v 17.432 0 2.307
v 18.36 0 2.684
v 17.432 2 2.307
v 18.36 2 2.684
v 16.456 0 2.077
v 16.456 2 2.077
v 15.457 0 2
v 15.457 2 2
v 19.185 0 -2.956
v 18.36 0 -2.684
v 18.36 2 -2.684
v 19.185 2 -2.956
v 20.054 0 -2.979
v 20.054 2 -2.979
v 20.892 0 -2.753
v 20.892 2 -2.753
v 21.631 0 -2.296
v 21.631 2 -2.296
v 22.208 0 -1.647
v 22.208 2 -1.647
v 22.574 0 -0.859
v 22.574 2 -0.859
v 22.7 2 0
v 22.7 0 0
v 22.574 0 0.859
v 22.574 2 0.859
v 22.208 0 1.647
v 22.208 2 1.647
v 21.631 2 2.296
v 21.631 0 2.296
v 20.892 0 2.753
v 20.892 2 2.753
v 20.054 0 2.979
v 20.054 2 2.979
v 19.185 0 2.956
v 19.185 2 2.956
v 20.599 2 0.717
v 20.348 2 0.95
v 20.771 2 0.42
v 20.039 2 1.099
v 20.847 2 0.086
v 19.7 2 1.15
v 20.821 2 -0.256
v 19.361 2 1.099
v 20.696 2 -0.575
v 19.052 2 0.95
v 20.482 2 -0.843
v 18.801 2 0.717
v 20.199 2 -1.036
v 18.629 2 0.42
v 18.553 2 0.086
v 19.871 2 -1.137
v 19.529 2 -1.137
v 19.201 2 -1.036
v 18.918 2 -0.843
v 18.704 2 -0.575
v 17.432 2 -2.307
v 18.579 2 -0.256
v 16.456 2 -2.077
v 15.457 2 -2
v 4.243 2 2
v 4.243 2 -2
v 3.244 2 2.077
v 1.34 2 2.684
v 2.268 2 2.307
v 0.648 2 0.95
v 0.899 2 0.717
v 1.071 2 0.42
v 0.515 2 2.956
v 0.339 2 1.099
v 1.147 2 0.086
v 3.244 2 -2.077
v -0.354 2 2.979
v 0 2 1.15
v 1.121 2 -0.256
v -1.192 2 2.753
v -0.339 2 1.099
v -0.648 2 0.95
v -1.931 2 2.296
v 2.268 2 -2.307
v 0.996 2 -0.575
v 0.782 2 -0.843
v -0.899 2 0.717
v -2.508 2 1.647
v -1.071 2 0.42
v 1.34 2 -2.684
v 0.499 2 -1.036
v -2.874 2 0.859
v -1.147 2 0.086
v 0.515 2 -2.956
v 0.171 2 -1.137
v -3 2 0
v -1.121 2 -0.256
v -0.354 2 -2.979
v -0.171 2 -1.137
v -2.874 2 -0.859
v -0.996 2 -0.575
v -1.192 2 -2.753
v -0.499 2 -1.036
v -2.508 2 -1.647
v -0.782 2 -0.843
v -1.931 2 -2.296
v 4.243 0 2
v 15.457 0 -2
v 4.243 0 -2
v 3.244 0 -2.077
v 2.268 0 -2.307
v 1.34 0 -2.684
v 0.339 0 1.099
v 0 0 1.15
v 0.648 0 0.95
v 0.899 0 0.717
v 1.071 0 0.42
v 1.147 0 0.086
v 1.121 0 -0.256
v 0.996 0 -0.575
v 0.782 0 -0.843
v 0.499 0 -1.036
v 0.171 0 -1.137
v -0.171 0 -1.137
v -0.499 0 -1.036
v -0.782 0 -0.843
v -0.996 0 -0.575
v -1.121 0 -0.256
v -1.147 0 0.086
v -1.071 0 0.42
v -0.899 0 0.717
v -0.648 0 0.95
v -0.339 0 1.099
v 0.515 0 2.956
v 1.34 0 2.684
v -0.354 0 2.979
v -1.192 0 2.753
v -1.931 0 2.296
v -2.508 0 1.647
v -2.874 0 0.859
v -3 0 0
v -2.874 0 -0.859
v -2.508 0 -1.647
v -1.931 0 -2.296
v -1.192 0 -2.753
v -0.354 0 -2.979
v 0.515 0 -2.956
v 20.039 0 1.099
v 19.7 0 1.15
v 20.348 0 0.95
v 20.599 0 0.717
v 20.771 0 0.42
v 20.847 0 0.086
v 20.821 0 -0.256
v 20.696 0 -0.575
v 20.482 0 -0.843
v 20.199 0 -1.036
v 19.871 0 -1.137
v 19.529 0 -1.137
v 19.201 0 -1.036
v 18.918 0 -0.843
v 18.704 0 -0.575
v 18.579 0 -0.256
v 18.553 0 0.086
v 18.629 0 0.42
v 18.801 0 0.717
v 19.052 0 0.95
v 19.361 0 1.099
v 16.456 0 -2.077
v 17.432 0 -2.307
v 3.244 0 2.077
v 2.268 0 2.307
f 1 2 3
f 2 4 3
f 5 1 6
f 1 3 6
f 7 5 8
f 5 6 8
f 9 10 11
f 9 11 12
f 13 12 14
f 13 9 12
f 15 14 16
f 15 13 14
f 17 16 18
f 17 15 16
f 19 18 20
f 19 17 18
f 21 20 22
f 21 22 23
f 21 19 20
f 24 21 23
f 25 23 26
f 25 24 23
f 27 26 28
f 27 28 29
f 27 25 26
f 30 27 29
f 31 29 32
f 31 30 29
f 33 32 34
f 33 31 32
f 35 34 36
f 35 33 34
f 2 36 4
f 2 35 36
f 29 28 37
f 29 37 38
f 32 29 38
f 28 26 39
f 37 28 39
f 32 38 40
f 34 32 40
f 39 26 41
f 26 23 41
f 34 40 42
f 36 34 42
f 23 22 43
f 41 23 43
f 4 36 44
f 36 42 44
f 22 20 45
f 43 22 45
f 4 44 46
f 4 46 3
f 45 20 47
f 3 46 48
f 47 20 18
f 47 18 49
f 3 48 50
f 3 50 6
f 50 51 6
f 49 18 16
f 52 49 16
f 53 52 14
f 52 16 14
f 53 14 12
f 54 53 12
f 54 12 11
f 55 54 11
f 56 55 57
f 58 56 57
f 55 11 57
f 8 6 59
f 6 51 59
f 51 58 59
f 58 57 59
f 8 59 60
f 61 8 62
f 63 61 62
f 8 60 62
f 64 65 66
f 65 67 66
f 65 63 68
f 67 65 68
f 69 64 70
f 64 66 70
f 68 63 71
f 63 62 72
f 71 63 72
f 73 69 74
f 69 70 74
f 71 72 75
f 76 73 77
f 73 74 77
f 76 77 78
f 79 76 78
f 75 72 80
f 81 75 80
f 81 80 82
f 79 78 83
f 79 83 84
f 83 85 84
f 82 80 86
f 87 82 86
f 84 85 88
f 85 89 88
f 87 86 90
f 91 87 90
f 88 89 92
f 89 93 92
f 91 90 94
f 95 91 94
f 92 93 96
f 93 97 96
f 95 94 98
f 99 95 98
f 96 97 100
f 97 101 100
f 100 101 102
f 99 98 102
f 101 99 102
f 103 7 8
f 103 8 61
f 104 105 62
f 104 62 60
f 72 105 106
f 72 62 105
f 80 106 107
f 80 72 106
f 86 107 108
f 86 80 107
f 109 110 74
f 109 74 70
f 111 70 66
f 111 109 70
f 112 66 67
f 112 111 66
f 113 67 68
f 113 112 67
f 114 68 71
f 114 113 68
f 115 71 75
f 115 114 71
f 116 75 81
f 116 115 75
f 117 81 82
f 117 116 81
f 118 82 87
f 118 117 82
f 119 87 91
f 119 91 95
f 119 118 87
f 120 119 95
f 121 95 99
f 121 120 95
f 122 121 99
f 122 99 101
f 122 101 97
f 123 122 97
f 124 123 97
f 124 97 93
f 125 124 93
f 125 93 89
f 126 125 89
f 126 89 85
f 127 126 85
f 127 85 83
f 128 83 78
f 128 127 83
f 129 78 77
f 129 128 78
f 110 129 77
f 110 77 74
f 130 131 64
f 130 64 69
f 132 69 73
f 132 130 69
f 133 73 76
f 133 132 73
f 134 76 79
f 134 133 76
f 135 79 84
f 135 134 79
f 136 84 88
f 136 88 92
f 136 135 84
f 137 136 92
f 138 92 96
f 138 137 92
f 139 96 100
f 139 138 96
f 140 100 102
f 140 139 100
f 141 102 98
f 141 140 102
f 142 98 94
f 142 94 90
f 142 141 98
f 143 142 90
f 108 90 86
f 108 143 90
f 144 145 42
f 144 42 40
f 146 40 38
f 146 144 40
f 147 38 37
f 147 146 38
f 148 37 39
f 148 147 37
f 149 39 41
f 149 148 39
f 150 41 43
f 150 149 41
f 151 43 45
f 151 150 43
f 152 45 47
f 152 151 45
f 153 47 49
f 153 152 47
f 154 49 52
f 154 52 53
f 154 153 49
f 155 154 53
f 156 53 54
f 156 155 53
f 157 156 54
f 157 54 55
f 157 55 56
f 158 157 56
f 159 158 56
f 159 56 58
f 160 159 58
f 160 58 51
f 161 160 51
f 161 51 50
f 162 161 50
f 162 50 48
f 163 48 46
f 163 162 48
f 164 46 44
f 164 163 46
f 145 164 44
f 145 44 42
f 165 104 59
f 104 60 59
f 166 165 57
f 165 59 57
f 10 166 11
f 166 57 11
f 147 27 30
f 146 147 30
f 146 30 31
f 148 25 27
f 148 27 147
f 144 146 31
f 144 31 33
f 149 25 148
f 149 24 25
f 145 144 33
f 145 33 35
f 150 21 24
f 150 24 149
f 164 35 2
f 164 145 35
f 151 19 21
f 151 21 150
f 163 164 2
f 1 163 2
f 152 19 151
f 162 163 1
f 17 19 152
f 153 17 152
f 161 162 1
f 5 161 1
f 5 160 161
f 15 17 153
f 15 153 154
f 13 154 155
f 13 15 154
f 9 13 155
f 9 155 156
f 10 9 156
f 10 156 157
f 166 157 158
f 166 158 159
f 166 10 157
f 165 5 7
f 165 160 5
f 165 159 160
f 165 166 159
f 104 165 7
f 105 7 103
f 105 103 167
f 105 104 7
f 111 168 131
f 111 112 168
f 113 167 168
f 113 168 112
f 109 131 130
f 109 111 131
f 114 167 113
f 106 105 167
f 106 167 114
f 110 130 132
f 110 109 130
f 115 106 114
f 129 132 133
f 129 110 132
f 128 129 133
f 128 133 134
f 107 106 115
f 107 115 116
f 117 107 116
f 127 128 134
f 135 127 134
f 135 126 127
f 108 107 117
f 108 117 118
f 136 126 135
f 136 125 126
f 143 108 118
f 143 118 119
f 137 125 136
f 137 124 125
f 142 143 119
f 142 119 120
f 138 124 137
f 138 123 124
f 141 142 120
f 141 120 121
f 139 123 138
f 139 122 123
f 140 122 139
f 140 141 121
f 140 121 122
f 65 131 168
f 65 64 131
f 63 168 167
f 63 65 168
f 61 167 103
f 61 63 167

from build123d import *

# Parameters (mm, degrees)
SKETCH_1_R      = 1.15
EXTRUDE_1_DEPTH = 2
FILLET_1_R      = 6.5


with BuildPart() as part:
    # Эскиз1 → Бобышка-Вытянуть1 (new body)
    with BuildSketch(Plane(origin=(0, 0, 0), x_dir=(1, 0, 0), z_dir=(0, 1, 0))):
        with BuildLine():
            Line((2.236067977, 2), (17.463932023, 2))
            ThreePointArc((17.463932023, 2), (22.7, 0), (17.463932023, -2))
            Line((17.463932023, -2), (2.236067977, -2))
            ThreePointArc((2.236067977, -2), (-3, 0), (2.236067977, 2))
        make_face()
        with Locations(Location((0, 0, 0), (0, 0, 270))):
            Circle(SKETCH_1_R, mode=Mode.SUBTRACT)
        with Locations(Location((19.7, 0, 0), (0, 0, 270))):
            Circle(SKETCH_1_R, mode=Mode.SUBTRACT)
    extrude(amount=EXTRUDE_1_DEPTH)

    # Скругление1
    fillet_1_edges = [part.edges().sort_by_distance(p)[0] for p in [
        (2.236067977, 1, 2),
        (2.236067977, 1, -2),
        (17.463932023, 1, -2),
        (17.463932023, 1, 2),
    ]]
    fillet(fillet_1_edges, radius=FILLET_1_R)


solid = part.part
